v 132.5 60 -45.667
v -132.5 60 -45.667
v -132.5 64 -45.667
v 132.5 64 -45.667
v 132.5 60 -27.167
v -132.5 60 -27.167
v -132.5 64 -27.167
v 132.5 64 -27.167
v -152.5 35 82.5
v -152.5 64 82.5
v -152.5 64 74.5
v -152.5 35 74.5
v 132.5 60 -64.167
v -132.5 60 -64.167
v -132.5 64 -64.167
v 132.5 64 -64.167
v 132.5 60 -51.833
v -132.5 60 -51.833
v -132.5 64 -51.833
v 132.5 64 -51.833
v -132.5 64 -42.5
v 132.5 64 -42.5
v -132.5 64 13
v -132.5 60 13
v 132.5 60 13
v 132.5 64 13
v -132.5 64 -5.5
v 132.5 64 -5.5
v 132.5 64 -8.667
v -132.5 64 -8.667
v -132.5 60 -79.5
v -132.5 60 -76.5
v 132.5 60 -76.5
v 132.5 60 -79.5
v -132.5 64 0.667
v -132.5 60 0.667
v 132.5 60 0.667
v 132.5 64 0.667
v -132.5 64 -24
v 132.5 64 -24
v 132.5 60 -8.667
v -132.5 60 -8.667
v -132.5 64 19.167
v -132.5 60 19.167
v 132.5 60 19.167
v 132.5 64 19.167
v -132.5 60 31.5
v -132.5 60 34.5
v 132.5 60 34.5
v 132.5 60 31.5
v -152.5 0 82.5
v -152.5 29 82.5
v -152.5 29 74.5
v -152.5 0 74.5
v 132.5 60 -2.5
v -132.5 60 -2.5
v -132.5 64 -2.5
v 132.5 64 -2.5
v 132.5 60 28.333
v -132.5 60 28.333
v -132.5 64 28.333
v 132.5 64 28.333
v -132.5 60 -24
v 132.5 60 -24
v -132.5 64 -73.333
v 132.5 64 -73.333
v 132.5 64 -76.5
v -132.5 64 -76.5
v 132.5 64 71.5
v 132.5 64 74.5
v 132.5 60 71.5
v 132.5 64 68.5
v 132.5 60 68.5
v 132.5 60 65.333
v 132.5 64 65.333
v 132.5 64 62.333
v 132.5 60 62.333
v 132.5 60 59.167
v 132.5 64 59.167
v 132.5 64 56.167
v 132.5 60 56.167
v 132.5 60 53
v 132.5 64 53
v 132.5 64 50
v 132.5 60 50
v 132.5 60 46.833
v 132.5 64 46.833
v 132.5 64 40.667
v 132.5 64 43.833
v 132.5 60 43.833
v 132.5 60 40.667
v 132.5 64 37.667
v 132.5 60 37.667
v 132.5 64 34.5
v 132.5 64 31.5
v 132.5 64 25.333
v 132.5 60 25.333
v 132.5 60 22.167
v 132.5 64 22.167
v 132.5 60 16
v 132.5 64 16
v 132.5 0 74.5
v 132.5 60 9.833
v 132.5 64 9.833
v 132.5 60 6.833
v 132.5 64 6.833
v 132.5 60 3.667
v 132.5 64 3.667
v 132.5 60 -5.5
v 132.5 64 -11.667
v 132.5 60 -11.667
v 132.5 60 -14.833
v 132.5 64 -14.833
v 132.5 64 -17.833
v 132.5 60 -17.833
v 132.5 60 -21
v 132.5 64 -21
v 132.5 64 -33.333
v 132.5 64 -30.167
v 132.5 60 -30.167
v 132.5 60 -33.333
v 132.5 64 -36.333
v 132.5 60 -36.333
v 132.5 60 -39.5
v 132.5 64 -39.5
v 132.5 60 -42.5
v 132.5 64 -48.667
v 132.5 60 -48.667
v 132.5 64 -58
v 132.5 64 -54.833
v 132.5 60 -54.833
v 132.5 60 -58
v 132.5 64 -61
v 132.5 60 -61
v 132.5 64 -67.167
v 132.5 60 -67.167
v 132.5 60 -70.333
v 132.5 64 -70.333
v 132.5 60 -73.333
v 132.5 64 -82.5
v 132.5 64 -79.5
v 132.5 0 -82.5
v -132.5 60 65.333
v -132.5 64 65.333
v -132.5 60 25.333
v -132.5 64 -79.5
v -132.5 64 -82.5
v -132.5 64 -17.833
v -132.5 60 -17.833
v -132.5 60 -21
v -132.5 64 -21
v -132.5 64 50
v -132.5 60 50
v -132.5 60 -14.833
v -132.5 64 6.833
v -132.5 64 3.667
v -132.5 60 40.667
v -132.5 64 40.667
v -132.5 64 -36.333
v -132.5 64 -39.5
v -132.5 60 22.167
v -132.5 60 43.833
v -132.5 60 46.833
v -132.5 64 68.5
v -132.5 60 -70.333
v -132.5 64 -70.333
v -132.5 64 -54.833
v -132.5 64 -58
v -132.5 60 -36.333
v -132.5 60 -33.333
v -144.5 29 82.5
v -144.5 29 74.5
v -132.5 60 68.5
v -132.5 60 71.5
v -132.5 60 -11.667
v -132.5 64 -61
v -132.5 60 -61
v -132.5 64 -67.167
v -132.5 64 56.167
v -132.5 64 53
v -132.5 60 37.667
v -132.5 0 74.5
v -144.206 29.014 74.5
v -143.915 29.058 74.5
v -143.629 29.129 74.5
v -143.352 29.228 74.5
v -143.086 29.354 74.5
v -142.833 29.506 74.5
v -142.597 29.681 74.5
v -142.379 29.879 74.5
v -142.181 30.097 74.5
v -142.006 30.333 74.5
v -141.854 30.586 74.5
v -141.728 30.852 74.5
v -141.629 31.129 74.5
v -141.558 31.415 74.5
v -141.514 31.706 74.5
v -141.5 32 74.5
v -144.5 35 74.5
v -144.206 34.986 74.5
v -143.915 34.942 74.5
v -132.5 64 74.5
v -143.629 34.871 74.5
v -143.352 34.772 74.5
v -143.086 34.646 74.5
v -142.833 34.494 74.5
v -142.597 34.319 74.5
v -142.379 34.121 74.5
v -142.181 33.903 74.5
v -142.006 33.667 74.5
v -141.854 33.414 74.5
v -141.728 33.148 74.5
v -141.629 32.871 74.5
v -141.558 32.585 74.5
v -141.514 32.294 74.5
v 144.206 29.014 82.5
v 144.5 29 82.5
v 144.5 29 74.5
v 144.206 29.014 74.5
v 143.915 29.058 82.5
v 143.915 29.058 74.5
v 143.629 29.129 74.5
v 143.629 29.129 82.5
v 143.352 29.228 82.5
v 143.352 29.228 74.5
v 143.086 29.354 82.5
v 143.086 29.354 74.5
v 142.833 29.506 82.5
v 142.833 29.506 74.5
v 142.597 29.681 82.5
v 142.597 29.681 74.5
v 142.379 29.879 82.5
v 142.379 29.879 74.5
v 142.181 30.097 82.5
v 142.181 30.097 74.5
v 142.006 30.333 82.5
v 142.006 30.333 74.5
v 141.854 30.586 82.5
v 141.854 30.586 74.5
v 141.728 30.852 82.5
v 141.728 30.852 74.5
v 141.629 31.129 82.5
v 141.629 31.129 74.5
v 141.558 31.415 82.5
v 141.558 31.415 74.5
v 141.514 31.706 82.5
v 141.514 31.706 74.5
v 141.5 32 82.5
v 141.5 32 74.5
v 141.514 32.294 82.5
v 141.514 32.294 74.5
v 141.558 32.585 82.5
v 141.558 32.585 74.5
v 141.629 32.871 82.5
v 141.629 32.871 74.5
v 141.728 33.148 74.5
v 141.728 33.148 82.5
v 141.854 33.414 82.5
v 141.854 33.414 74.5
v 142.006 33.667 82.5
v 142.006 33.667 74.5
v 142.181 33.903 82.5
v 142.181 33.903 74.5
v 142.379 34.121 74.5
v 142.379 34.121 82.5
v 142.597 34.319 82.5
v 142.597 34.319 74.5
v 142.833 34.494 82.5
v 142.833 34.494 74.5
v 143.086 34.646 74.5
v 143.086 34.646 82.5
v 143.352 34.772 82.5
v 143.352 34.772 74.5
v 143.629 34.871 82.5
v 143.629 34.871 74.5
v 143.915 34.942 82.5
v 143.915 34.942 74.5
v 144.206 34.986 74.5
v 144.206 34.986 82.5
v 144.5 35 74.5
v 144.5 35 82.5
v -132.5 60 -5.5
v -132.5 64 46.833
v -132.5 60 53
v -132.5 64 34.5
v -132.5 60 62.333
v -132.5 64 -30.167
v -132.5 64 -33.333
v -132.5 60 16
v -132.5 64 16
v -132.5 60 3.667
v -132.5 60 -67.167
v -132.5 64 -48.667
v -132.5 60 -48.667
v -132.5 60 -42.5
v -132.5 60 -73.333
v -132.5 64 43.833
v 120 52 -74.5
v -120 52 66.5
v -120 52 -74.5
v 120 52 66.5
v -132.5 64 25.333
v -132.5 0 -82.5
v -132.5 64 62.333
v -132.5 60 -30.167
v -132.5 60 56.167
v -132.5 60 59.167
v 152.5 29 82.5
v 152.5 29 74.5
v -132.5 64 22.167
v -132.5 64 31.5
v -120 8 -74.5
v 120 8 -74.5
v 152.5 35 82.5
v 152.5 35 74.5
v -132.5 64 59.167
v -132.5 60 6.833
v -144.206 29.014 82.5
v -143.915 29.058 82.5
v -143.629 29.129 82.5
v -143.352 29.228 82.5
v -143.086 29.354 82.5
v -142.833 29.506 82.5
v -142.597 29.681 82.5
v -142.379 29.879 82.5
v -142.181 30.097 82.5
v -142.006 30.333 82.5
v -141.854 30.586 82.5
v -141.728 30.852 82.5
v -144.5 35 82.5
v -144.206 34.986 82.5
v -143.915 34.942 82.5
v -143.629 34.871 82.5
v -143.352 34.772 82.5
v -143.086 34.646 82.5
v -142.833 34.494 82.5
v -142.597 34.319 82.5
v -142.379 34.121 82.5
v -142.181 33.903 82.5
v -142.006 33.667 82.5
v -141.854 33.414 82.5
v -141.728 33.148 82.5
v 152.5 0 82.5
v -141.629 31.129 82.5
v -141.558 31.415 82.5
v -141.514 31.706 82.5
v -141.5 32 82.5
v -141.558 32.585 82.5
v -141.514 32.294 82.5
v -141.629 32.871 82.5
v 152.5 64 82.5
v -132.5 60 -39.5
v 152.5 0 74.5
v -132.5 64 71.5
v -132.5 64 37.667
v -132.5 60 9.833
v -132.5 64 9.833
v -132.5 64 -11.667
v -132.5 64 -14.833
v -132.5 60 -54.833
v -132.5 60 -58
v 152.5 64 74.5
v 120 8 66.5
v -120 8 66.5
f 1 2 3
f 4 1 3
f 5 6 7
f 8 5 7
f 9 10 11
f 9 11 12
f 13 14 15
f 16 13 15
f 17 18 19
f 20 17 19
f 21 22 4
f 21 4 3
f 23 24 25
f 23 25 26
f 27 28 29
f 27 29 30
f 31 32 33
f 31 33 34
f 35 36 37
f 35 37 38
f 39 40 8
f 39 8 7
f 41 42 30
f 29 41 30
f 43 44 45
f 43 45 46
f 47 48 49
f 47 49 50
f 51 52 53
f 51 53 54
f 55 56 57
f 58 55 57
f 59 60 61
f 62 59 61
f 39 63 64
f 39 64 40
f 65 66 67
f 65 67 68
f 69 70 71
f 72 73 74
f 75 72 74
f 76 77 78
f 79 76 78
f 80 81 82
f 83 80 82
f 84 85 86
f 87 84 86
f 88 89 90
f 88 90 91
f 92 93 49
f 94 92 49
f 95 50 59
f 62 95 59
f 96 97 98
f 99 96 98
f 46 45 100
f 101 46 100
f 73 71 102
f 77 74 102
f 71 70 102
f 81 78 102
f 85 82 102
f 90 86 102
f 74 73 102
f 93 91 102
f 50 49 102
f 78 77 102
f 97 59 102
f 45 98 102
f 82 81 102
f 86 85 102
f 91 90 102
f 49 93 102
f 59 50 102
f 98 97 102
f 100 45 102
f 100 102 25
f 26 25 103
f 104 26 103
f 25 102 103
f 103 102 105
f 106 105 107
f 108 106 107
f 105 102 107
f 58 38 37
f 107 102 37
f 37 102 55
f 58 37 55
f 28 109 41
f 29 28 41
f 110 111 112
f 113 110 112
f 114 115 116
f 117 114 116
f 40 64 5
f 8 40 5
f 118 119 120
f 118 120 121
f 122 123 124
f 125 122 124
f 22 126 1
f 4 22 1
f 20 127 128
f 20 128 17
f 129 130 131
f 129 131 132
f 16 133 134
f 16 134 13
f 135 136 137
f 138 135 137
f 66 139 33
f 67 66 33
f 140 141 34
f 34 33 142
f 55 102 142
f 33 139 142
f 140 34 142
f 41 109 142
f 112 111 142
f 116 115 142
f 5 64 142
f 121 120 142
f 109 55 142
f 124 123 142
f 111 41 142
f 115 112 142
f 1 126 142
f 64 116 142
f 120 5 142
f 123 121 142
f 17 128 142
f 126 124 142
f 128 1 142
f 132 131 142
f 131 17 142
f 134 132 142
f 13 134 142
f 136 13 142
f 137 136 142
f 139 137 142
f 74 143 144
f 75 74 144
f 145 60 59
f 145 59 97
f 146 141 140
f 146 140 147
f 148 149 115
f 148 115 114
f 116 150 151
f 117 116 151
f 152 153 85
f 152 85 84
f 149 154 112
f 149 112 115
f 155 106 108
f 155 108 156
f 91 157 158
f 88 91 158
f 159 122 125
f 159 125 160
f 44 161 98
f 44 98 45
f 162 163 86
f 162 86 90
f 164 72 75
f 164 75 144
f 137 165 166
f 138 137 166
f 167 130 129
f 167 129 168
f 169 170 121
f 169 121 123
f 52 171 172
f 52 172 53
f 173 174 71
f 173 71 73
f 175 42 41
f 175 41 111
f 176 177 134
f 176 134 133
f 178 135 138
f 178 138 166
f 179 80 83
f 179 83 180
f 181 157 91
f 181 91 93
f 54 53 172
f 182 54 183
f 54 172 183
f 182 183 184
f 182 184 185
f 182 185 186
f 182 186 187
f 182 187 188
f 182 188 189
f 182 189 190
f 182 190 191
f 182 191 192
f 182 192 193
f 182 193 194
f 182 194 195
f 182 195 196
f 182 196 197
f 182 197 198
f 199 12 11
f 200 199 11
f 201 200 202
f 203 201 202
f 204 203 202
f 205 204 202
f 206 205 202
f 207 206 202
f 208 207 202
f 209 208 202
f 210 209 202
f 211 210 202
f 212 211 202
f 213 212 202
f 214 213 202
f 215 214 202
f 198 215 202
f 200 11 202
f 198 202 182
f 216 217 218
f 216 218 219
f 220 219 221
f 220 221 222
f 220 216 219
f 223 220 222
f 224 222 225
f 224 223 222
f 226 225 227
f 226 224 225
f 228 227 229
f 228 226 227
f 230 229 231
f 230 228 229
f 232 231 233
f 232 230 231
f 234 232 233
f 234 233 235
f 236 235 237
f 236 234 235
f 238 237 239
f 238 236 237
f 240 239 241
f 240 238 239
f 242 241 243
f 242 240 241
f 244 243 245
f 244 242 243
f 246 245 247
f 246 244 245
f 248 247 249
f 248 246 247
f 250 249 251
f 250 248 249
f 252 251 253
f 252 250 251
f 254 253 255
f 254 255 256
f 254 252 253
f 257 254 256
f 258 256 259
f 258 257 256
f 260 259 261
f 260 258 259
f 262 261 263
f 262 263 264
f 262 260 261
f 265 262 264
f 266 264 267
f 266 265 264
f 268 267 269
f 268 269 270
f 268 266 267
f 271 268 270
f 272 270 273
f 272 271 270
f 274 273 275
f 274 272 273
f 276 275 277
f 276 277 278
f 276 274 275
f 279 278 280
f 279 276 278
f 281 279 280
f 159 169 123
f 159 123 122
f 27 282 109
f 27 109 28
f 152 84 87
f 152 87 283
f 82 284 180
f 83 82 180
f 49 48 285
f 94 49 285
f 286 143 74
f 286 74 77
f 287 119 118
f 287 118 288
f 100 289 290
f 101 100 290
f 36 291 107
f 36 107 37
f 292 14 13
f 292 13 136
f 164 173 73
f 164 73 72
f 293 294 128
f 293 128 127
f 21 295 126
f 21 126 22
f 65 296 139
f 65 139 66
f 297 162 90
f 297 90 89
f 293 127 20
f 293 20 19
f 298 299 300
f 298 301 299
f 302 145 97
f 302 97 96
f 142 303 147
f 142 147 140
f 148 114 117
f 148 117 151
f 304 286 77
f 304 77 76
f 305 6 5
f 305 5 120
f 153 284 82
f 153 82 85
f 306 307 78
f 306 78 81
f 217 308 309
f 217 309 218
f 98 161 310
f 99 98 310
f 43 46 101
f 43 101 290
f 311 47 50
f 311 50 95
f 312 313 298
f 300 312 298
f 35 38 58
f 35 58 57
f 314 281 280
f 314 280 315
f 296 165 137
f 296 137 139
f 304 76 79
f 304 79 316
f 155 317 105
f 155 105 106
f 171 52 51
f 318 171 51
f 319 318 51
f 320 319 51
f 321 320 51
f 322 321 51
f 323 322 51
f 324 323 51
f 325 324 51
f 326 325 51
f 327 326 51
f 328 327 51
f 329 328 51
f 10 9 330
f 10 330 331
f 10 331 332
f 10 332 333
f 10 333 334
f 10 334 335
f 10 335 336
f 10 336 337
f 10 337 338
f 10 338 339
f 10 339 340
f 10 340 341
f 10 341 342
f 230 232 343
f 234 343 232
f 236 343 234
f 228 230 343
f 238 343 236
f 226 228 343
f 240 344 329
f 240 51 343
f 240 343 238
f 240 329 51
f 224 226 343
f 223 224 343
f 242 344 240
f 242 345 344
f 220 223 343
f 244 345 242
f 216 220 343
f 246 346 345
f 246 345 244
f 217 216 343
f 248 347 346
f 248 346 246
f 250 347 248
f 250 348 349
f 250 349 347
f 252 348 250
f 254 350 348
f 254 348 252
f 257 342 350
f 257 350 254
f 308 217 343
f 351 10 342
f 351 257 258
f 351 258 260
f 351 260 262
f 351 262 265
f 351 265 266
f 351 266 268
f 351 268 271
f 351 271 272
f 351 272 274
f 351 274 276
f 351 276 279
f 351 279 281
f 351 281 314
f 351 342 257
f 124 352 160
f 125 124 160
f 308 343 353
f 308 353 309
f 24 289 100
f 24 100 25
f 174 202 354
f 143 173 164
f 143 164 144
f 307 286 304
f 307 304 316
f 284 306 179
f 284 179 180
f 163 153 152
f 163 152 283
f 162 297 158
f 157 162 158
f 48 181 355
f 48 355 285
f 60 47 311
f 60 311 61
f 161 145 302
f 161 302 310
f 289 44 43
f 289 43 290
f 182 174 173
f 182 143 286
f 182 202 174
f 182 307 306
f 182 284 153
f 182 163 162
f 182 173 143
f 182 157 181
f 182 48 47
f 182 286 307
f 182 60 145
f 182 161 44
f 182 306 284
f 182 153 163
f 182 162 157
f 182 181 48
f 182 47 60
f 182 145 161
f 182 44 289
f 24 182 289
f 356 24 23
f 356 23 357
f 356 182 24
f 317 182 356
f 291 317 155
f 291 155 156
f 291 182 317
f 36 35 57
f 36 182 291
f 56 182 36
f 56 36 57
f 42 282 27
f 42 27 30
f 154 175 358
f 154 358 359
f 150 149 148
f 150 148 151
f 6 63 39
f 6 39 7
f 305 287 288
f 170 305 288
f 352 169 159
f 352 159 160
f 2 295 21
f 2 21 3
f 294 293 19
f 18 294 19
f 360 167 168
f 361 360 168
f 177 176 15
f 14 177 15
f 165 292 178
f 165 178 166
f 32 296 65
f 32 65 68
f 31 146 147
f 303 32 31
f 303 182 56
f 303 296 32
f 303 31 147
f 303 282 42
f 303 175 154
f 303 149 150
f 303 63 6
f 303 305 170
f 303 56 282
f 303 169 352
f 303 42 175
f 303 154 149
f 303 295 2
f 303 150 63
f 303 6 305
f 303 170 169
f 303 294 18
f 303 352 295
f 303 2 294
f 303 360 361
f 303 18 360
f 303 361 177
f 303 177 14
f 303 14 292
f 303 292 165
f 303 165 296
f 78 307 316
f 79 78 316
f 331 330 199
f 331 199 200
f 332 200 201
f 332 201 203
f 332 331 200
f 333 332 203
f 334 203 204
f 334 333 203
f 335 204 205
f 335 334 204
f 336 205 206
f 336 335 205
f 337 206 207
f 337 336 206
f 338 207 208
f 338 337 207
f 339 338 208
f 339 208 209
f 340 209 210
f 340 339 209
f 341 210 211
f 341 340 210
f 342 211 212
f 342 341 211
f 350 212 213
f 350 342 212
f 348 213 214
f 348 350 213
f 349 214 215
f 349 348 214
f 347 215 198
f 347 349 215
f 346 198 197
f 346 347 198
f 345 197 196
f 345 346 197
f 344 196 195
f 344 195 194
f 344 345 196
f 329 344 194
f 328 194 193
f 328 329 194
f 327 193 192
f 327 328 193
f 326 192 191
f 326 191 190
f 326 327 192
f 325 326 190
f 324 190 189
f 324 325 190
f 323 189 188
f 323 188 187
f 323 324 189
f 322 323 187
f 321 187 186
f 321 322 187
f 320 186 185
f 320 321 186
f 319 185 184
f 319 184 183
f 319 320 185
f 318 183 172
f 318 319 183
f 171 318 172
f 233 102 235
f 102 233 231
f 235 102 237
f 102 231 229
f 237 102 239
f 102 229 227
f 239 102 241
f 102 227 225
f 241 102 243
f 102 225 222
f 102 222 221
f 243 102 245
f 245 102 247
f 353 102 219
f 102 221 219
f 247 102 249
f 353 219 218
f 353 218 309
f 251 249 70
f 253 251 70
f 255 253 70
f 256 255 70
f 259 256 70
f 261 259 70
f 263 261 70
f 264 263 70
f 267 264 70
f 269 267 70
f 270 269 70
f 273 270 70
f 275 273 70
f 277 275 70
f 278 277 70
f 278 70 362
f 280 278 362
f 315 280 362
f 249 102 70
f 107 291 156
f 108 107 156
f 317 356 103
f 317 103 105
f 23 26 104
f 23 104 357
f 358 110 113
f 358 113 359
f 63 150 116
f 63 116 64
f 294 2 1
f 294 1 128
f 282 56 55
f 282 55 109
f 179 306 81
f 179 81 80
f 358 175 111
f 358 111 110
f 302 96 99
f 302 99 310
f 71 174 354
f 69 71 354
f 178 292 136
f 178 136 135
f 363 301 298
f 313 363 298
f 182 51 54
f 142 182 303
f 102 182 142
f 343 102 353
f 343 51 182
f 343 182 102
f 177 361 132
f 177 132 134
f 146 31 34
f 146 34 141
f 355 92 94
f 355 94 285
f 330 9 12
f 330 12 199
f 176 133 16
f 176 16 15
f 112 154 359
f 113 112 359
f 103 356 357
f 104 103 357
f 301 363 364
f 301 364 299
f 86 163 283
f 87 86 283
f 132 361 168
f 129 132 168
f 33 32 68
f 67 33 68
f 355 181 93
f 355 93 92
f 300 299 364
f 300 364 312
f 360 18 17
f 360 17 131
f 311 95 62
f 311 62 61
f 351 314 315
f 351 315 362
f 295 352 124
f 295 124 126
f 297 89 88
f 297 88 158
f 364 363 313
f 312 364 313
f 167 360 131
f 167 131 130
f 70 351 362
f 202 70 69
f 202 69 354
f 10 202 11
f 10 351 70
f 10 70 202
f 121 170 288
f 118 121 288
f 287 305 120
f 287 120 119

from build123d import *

# Parameters (mm, degrees)
SKETCH_1_W               = 265
SKETCH_1_H               = 165
EXTRUDE_1_DEPTH          = 64
EXTRUDE_2_DEPTH          = 8
CUT_EXTRUDE_1_DEPTH      = 185.820182881
CUT_EXTRUDE_1_DEPTH_BACK = 185.820182881
SKETCH_3_W               = 3
SKETCH_3_H               = 4
SKETCH_4_W               = 141
SKETCH_4_H               = 44
CUT_EXTRUDE_2_DEPTH      = 120


with BuildPart() as part:
    # 草图1 → 凸台-拉伸1 (new body)
    with BuildSketch(Plane(origin=(0, 0, 0), x_dir=(1, 0, 0), z_dir=(0, 1, 0))):
        Rectangle(SKETCH_1_W, SKETCH_1_H)
    extrude(amount=EXTRUDE_1_DEPTH)

    # 草图2 → 凸台-拉伸2 (add)
    with BuildSketch(Plane.XY.offset(82.5)):
        with BuildLine():
            Line((-132.5, 64), (-152.5, 64))
            Line((-152.5, 64), (-152.5, 35))
            Line((-152.5, 35), (-144.5, 35))
            ThreePointArc((-144.5, 35), (-141.5, 32), (-144.5, 29))
            Line((-144.5, 29), (-152.5, 29))
            Line((-152.5, 29), (-152.5, 0))
            Line((-152.5, 0), (-132.5, 0))
            Line((-132.5, 0), (-132.5, 64))
        make_face()
        with BuildLine():
            Line((152.5, 64), (132.5, 64))
            Line((132.5, 64), (132.5, 0))
            Line((132.5, 0), (152.5, 0))
            Line((152.5, 0), (152.5, 29))
            Line((152.5, 29), (144.5, 29))
            ThreePointArc((144.5, 29), (141.5, 32), (144.5, 35))
            Line((144.5, 35), (152.5, 35))
            Line((152.5, 35), (152.5, 64))
        make_face()
    extrude(amount=-EXTRUDE_2_DEPTH)

    # 草图3 → 切除-拉伸1 (cut, two sides: drawn at the far end of the back side and taken through both)
    with BuildSketch(Plane(origin=(0, 0, 0), x_dir=(0, 0, -1), z_dir=(1, 0, 0)).offset(-CUT_EXTRUDE_1_DEPTH_BACK)):
        with Locations((-70, 62)):
            Rectangle(SKETCH_3_W, SKETCH_3_H)
        with Locations((-63.833333333, 62)):
            Rectangle(SKETCH_3_W, SKETCH_3_H)
        with Locations((-57.666666667, 62)):
            Rectangle(SKETCH_3_W, SKETCH_3_H)
        with Locations((-51.5, 62)):
            Rectangle(SKETCH_3_W, SKETCH_3_H)
        with Locations((-45.333333333, 62)):
            Rectangle(SKETCH_3_W, SKETCH_3_H)
        with Locations((-39.166666667, 62)):
            Rectangle(SKETCH_3_W, SKETCH_3_H)
        with Locations((-33, 62)):
            Rectangle(SKETCH_3_W, SKETCH_3_H)
        with Locations((-26.833333333, 62)):
            Rectangle(SKETCH_3_W, SKETCH_3_H)
        with Locations((-20.666666667, 62)):
            Rectangle(SKETCH_3_W, SKETCH_3_H)
        with Locations((-14.5, 62)):
            Rectangle(SKETCH_3_W, SKETCH_3_H)
        with Locations((-8.333333333, 62)):
            Rectangle(SKETCH_3_W, SKETCH_3_H)
        with Locations((-2.166666667, 62)):
            Rectangle(SKETCH_3_W, SKETCH_3_H)
        with Locations((4, 62)):
            Rectangle(SKETCH_3_W, SKETCH_3_H)
        with Locations((10.166666667, 62)):
            Rectangle(SKETCH_3_W, SKETCH_3_H)
        with Locations((16.333333333, 62)):
            Rectangle(SKETCH_3_W, SKETCH_3_H)
        with Locations((22.5, 62)):
            Rectangle(SKETCH_3_W, SKETCH_3_H)
        with Locations((28.666666667, 62)):
            Rectangle(SKETCH_3_W, SKETCH_3_H)
        with Locations((34.833333333, 62)):
            Rectangle(SKETCH_3_W, SKETCH_3_H)
        with Locations((41, 62)):
            Rectangle(SKETCH_3_W, SKETCH_3_H)
        with Locations((47.166666667, 62)):
            Rectangle(SKETCH_3_W, SKETCH_3_H)
        with Locations((53.333333333, 62)):
            Rectangle(SKETCH_3_W, SKETCH_3_H)
        with Locations((59.5, 62)):
            Rectangle(SKETCH_3_W, SKETCH_3_H)
        with Locations((65.666666667, 62)):
            Rectangle(SKETCH_3_W, SKETCH_3_H)
        with Locations((71.833333333, 62)):
            Rectangle(SKETCH_3_W, SKETCH_3_H)
        with Locations((78, 62)):
            Rectangle(SKETCH_3_W, SKETCH_3_H)
    extrude(amount=CUT_EXTRUDE_1_DEPTH + CUT_EXTRUDE_1_DEPTH_BACK, mode=Mode.SUBTRACT)

    # 草图4 → 切除-拉伸2 (cut, symmetric)
    with BuildSketch(Plane(origin=(0, 0, 0), x_dir=(0, 0, -1), z_dir=(1, 0, 0))):
        with Locations((4, 30)):
            Rectangle(SKETCH_4_W, SKETCH_4_H)
    extrude(amount=CUT_EXTRUDE_2_DEPTH, both=True, mode=Mode.SUBTRACT)


solid = part.part
